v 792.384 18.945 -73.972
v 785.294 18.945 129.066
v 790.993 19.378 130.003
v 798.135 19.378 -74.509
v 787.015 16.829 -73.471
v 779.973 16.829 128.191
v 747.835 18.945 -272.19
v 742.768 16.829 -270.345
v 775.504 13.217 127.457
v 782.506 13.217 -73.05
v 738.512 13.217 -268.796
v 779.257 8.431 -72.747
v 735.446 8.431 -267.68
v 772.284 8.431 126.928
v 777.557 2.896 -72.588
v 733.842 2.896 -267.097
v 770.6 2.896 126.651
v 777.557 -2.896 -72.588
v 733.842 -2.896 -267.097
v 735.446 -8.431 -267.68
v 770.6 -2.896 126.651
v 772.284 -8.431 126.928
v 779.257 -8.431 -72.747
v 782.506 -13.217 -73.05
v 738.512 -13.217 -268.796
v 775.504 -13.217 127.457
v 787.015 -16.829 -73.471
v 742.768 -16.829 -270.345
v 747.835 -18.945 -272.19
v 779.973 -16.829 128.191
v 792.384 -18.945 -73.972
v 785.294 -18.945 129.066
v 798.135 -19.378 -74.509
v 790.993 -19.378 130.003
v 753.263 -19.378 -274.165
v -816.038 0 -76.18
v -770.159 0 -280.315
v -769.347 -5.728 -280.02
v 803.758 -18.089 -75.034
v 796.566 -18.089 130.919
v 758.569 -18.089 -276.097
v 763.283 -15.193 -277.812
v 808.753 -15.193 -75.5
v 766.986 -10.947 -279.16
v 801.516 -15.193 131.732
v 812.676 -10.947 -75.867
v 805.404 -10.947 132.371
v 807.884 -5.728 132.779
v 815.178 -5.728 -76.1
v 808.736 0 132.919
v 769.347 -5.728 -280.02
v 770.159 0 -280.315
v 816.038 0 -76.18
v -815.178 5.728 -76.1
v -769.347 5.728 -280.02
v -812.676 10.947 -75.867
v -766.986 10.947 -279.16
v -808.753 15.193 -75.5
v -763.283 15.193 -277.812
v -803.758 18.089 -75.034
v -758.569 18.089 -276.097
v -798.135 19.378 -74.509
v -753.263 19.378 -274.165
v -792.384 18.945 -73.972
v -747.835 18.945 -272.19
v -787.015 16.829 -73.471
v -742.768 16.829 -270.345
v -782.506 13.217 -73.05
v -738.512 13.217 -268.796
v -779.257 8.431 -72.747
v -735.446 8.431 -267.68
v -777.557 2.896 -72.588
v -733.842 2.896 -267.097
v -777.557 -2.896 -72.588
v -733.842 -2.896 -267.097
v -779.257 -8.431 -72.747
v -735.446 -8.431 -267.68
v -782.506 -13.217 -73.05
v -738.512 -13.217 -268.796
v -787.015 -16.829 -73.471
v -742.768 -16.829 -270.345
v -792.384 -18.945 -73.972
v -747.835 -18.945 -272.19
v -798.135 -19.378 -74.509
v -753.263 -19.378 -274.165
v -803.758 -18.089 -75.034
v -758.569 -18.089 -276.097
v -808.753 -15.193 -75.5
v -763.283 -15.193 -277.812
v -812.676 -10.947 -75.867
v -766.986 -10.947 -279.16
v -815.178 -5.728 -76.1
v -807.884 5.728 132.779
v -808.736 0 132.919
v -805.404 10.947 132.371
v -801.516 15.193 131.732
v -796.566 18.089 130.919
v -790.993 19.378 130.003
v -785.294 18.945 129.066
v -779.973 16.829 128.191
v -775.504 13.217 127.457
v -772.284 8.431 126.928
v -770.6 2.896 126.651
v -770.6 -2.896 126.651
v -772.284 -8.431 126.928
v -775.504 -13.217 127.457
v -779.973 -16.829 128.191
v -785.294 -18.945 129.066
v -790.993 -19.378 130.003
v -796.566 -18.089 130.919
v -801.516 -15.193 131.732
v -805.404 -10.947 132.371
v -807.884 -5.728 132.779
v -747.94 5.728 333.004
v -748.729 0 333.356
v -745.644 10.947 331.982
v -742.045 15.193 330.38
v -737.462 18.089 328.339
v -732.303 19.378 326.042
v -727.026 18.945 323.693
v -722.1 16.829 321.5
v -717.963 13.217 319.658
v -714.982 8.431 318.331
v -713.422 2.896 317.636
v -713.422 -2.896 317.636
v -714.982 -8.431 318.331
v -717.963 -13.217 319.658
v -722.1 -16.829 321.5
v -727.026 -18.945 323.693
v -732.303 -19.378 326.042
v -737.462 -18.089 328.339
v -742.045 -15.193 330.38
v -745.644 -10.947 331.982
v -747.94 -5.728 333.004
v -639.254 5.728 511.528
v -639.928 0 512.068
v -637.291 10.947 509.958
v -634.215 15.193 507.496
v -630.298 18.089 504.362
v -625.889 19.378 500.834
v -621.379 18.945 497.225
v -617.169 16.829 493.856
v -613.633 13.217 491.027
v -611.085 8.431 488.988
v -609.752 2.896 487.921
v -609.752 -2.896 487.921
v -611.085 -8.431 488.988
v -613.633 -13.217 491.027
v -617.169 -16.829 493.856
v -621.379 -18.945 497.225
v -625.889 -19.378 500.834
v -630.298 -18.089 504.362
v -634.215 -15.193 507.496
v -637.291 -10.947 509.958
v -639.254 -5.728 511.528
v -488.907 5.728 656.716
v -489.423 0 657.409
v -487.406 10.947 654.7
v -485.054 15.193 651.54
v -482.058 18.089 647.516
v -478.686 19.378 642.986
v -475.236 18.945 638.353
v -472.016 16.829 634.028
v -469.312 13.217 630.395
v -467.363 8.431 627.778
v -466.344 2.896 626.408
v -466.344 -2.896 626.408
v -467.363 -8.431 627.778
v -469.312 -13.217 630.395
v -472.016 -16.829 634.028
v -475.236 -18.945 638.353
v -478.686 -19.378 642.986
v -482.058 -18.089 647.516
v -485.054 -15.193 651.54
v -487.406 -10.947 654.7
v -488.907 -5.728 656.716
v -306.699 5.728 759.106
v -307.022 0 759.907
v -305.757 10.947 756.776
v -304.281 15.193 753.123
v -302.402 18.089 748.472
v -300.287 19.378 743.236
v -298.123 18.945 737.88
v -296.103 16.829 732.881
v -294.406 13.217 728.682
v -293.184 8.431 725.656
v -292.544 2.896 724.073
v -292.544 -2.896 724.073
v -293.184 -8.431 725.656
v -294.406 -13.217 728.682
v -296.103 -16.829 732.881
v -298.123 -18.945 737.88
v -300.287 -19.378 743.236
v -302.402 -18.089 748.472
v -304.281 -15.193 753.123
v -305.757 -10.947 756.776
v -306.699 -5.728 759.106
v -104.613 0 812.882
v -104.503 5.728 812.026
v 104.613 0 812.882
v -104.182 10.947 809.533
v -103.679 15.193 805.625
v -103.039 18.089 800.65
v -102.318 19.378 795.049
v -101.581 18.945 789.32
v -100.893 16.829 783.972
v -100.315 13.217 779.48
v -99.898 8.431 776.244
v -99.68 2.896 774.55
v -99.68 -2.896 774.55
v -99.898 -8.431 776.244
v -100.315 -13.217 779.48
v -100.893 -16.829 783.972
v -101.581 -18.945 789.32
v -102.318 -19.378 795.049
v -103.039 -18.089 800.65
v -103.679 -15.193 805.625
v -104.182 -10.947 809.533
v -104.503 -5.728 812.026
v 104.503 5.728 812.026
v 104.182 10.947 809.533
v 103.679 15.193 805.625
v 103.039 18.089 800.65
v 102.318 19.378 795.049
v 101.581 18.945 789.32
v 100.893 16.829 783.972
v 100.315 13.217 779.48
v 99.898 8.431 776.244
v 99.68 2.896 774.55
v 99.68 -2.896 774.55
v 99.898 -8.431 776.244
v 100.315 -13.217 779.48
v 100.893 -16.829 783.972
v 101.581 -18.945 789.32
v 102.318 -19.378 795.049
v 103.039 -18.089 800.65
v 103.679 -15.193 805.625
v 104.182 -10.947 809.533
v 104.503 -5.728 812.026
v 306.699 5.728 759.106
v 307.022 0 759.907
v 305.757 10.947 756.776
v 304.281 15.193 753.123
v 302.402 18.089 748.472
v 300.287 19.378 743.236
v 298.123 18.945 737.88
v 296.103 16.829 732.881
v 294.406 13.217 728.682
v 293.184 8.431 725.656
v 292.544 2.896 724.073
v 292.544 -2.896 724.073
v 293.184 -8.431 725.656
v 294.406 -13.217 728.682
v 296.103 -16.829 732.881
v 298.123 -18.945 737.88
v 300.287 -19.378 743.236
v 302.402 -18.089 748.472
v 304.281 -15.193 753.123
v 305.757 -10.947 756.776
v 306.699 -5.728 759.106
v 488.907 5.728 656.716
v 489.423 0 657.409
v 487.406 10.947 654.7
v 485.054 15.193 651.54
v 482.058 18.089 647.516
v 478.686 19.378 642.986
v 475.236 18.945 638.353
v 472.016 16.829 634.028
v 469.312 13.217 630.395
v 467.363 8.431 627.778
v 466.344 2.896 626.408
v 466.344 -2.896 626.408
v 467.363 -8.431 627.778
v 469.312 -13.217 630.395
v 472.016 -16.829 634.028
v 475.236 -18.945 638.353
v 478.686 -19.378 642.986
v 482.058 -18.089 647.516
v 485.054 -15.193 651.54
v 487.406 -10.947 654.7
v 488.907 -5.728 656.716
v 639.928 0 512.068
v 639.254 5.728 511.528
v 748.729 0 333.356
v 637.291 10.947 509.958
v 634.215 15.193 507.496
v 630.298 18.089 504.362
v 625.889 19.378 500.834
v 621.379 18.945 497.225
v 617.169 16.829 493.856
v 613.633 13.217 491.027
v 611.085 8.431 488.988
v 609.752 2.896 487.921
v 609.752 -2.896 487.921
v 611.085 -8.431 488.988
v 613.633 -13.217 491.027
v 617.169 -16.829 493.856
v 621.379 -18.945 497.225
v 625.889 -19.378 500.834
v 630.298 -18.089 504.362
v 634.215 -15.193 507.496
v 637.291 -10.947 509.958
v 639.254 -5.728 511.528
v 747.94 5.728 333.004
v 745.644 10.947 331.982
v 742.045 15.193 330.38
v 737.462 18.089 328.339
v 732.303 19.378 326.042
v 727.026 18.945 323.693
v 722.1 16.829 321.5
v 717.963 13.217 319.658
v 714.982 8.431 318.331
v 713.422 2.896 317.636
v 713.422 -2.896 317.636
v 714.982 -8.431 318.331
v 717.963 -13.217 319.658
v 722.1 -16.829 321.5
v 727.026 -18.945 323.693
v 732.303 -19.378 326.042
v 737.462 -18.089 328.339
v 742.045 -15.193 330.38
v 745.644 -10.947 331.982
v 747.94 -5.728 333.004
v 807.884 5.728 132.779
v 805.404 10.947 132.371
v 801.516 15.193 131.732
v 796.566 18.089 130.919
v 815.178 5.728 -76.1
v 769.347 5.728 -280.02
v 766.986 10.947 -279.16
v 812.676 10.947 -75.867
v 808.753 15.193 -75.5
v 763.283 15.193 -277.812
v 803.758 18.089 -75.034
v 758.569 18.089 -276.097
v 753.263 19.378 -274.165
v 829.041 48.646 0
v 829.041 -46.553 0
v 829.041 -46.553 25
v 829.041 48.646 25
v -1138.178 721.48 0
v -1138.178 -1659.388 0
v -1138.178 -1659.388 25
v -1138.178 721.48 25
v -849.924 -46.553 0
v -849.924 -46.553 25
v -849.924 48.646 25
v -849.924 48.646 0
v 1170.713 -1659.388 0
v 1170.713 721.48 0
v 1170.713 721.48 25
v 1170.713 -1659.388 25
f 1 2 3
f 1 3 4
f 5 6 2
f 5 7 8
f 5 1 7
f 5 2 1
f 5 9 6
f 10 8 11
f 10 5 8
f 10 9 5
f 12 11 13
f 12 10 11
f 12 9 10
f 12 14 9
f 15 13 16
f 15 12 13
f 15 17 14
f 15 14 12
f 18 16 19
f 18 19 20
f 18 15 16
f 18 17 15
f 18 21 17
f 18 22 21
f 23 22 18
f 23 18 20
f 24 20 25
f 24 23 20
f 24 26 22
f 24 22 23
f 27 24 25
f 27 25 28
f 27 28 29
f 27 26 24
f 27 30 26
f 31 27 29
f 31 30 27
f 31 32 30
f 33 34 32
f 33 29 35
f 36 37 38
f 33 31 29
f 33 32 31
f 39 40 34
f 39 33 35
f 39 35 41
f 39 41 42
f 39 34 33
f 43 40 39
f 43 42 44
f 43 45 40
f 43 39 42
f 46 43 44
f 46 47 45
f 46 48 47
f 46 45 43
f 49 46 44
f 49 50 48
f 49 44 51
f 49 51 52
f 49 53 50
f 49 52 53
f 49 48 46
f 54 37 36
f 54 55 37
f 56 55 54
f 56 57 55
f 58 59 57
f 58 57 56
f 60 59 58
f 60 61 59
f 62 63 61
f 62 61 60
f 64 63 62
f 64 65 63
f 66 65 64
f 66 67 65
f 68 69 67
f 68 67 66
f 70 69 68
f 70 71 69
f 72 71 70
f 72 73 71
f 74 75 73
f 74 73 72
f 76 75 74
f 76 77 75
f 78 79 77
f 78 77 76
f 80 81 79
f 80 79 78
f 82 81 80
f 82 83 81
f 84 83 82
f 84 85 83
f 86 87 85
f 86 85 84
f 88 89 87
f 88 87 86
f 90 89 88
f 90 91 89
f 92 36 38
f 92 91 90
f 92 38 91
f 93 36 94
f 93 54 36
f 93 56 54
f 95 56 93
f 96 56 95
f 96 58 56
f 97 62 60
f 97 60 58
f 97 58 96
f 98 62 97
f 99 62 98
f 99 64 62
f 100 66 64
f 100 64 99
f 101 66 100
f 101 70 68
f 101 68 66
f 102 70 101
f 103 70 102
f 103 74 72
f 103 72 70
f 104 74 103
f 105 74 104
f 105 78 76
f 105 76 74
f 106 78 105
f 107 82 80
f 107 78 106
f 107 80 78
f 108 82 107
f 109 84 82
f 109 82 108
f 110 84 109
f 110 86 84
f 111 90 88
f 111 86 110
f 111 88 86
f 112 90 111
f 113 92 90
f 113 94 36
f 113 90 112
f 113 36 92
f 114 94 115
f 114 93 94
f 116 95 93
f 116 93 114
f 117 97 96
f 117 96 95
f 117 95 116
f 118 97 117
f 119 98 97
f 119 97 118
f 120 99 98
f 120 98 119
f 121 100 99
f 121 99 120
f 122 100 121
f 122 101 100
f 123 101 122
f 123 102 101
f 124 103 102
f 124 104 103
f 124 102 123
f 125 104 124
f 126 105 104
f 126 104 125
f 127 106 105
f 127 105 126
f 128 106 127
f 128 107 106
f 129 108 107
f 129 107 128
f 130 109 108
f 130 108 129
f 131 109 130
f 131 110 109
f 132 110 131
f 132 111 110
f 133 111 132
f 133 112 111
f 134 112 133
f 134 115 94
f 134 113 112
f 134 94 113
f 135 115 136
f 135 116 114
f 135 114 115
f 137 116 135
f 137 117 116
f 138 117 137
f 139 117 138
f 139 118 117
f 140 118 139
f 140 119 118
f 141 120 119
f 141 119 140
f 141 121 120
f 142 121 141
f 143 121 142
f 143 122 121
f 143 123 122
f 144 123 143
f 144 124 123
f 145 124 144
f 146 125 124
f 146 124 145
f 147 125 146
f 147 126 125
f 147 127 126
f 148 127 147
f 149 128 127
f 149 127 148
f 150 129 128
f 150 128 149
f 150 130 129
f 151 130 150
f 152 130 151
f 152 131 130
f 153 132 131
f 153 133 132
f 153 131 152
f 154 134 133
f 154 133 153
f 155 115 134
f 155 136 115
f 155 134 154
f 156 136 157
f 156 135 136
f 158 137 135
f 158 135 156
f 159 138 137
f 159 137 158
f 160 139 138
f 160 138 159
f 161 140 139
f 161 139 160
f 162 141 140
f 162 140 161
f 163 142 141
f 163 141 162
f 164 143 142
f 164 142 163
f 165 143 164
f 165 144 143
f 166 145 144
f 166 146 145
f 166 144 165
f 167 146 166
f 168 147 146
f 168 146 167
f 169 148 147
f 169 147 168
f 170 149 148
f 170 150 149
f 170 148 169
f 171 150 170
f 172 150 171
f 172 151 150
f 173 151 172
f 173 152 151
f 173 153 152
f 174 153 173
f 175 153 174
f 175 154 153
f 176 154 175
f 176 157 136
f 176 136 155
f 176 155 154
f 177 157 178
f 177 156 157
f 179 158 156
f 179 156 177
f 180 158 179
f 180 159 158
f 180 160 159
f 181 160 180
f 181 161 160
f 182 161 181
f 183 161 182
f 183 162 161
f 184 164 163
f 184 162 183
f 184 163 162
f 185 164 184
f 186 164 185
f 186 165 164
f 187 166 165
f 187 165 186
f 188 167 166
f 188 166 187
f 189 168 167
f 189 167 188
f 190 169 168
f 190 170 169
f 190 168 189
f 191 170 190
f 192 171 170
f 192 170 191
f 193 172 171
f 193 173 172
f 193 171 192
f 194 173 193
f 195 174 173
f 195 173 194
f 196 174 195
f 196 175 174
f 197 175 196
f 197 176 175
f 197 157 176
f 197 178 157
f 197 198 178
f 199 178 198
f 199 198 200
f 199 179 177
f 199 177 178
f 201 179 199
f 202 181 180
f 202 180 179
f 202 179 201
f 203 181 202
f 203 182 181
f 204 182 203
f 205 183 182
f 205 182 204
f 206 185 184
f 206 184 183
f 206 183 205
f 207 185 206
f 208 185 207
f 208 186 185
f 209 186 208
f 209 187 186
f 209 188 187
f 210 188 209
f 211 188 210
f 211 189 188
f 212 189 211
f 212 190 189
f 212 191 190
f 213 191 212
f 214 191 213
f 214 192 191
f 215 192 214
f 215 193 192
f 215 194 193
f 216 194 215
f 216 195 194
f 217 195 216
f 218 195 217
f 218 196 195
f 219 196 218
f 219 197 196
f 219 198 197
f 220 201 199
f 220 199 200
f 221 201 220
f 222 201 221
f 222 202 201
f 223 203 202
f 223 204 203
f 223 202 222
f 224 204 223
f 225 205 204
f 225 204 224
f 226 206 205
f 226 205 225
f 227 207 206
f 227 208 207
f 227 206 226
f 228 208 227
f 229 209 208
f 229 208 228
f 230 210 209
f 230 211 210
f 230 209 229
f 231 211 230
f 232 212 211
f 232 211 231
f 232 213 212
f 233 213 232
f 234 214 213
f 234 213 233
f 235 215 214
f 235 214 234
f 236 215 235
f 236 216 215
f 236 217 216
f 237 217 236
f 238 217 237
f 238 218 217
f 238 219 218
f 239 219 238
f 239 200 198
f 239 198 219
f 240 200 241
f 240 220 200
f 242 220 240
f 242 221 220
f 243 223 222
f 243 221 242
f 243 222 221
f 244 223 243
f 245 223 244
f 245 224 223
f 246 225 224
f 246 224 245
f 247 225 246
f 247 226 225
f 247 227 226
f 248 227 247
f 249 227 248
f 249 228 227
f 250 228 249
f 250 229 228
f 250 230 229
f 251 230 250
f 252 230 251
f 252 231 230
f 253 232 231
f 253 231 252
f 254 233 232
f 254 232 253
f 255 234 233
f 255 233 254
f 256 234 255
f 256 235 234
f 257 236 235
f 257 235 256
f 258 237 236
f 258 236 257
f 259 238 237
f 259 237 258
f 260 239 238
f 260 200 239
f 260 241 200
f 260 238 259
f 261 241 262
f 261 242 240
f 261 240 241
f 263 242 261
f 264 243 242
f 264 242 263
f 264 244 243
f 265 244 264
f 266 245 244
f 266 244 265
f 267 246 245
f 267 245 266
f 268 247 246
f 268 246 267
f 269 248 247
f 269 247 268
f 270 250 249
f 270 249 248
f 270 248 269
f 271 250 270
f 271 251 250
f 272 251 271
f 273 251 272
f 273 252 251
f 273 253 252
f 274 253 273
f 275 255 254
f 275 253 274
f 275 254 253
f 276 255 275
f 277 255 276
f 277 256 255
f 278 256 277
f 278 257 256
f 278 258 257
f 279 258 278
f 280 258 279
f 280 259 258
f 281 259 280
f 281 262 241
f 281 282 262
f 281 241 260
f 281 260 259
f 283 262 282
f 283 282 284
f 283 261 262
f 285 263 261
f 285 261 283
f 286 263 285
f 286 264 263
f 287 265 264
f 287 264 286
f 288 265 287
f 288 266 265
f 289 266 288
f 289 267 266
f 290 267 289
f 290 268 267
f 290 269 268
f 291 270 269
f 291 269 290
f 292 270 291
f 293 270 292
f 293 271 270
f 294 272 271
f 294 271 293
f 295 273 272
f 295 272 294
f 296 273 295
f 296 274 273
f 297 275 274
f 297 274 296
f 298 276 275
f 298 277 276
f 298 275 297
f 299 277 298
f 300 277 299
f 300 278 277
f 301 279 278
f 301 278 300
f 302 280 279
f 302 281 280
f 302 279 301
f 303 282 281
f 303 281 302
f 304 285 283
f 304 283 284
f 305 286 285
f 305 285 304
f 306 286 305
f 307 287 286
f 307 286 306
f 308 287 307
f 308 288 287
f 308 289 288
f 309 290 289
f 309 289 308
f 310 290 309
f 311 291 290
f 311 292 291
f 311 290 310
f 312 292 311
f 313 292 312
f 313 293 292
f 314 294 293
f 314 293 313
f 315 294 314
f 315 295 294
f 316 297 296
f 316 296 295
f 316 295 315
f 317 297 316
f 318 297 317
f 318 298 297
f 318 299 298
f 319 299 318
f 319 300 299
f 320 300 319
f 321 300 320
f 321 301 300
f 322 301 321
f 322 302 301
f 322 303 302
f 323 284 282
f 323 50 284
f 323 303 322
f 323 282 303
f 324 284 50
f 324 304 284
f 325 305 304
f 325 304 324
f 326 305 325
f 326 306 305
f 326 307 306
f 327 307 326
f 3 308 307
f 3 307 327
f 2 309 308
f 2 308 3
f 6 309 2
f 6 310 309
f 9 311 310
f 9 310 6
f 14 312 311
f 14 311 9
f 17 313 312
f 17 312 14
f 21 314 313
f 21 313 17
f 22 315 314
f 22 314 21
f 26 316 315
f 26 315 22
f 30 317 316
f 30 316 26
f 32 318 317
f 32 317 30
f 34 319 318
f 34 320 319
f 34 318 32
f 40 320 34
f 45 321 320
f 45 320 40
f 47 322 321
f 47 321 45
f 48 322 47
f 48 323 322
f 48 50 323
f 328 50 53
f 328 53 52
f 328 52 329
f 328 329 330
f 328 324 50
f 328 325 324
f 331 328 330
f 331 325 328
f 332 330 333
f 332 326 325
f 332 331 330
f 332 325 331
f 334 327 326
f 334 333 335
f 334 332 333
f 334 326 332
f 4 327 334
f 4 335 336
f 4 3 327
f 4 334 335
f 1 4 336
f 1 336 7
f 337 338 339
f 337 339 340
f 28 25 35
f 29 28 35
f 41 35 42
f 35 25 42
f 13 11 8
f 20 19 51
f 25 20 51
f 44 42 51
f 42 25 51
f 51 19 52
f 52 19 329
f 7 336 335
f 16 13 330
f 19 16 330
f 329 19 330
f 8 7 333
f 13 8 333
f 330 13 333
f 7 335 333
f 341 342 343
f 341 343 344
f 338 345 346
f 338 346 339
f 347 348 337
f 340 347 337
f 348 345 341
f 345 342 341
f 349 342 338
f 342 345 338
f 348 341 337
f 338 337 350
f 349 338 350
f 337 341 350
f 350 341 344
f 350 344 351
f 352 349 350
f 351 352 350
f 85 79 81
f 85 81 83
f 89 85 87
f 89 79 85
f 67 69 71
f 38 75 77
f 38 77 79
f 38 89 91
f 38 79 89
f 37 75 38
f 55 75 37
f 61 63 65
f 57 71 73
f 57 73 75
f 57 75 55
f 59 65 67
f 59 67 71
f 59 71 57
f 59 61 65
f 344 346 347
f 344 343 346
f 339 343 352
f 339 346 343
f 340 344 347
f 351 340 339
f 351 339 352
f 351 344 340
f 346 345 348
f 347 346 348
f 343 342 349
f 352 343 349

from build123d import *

# Parameters (mm, degrees)
F1_ANGLE_BACK = 200
F1_ANGLE      = 220
F2_W          = 2308.891415596
F2_H          = 2380.8678388596
F2_W_2        = 1678.9654493332
F2_H_2        = 95.1990783215
F3_DEPTH      = 25


with BuildPart() as f1:
    # F0 (on Top) → F1 (revolve)
    with BuildSketch(Plane.XY, mode=Mode.PRIVATE) as f1_sk:
        with BuildLine():
            ThreePointArc((780.7208846222, 0), (800.1533150673, -19.4324304451), (819.5857455124, 0))
            ThreePointArc((819.5857455124, 0), (800.1533150673, 19.4324304451), (780.7208846222, 0))
        make_face()
    revolve(f1_sk.sketch.rotate(Axis((0, -4.0102191269, 0), (0, 1, 0)), -F1_ANGLE_BACK), axis=Axis((0, -4.0102191269, 0), (0, 1, 0)), revolution_arc=F1_ANGLE)


with BuildPart() as f3:
    # F2 (on Top) → F3 (new body)
    with BuildSketch(Plane.XY):
        with Locations((16.2675976753, -468.9540266991)):
            Rectangle(F2_W, F2_H)
        with Locations((-10.4417204857, 1.0464452207)):
            Rectangle(F2_W_2, F2_H_2, mode=Mode.SUBTRACT)
    extrude(amount=F3_DEPTH)


solid = Compound([f1.part, f3.part])
